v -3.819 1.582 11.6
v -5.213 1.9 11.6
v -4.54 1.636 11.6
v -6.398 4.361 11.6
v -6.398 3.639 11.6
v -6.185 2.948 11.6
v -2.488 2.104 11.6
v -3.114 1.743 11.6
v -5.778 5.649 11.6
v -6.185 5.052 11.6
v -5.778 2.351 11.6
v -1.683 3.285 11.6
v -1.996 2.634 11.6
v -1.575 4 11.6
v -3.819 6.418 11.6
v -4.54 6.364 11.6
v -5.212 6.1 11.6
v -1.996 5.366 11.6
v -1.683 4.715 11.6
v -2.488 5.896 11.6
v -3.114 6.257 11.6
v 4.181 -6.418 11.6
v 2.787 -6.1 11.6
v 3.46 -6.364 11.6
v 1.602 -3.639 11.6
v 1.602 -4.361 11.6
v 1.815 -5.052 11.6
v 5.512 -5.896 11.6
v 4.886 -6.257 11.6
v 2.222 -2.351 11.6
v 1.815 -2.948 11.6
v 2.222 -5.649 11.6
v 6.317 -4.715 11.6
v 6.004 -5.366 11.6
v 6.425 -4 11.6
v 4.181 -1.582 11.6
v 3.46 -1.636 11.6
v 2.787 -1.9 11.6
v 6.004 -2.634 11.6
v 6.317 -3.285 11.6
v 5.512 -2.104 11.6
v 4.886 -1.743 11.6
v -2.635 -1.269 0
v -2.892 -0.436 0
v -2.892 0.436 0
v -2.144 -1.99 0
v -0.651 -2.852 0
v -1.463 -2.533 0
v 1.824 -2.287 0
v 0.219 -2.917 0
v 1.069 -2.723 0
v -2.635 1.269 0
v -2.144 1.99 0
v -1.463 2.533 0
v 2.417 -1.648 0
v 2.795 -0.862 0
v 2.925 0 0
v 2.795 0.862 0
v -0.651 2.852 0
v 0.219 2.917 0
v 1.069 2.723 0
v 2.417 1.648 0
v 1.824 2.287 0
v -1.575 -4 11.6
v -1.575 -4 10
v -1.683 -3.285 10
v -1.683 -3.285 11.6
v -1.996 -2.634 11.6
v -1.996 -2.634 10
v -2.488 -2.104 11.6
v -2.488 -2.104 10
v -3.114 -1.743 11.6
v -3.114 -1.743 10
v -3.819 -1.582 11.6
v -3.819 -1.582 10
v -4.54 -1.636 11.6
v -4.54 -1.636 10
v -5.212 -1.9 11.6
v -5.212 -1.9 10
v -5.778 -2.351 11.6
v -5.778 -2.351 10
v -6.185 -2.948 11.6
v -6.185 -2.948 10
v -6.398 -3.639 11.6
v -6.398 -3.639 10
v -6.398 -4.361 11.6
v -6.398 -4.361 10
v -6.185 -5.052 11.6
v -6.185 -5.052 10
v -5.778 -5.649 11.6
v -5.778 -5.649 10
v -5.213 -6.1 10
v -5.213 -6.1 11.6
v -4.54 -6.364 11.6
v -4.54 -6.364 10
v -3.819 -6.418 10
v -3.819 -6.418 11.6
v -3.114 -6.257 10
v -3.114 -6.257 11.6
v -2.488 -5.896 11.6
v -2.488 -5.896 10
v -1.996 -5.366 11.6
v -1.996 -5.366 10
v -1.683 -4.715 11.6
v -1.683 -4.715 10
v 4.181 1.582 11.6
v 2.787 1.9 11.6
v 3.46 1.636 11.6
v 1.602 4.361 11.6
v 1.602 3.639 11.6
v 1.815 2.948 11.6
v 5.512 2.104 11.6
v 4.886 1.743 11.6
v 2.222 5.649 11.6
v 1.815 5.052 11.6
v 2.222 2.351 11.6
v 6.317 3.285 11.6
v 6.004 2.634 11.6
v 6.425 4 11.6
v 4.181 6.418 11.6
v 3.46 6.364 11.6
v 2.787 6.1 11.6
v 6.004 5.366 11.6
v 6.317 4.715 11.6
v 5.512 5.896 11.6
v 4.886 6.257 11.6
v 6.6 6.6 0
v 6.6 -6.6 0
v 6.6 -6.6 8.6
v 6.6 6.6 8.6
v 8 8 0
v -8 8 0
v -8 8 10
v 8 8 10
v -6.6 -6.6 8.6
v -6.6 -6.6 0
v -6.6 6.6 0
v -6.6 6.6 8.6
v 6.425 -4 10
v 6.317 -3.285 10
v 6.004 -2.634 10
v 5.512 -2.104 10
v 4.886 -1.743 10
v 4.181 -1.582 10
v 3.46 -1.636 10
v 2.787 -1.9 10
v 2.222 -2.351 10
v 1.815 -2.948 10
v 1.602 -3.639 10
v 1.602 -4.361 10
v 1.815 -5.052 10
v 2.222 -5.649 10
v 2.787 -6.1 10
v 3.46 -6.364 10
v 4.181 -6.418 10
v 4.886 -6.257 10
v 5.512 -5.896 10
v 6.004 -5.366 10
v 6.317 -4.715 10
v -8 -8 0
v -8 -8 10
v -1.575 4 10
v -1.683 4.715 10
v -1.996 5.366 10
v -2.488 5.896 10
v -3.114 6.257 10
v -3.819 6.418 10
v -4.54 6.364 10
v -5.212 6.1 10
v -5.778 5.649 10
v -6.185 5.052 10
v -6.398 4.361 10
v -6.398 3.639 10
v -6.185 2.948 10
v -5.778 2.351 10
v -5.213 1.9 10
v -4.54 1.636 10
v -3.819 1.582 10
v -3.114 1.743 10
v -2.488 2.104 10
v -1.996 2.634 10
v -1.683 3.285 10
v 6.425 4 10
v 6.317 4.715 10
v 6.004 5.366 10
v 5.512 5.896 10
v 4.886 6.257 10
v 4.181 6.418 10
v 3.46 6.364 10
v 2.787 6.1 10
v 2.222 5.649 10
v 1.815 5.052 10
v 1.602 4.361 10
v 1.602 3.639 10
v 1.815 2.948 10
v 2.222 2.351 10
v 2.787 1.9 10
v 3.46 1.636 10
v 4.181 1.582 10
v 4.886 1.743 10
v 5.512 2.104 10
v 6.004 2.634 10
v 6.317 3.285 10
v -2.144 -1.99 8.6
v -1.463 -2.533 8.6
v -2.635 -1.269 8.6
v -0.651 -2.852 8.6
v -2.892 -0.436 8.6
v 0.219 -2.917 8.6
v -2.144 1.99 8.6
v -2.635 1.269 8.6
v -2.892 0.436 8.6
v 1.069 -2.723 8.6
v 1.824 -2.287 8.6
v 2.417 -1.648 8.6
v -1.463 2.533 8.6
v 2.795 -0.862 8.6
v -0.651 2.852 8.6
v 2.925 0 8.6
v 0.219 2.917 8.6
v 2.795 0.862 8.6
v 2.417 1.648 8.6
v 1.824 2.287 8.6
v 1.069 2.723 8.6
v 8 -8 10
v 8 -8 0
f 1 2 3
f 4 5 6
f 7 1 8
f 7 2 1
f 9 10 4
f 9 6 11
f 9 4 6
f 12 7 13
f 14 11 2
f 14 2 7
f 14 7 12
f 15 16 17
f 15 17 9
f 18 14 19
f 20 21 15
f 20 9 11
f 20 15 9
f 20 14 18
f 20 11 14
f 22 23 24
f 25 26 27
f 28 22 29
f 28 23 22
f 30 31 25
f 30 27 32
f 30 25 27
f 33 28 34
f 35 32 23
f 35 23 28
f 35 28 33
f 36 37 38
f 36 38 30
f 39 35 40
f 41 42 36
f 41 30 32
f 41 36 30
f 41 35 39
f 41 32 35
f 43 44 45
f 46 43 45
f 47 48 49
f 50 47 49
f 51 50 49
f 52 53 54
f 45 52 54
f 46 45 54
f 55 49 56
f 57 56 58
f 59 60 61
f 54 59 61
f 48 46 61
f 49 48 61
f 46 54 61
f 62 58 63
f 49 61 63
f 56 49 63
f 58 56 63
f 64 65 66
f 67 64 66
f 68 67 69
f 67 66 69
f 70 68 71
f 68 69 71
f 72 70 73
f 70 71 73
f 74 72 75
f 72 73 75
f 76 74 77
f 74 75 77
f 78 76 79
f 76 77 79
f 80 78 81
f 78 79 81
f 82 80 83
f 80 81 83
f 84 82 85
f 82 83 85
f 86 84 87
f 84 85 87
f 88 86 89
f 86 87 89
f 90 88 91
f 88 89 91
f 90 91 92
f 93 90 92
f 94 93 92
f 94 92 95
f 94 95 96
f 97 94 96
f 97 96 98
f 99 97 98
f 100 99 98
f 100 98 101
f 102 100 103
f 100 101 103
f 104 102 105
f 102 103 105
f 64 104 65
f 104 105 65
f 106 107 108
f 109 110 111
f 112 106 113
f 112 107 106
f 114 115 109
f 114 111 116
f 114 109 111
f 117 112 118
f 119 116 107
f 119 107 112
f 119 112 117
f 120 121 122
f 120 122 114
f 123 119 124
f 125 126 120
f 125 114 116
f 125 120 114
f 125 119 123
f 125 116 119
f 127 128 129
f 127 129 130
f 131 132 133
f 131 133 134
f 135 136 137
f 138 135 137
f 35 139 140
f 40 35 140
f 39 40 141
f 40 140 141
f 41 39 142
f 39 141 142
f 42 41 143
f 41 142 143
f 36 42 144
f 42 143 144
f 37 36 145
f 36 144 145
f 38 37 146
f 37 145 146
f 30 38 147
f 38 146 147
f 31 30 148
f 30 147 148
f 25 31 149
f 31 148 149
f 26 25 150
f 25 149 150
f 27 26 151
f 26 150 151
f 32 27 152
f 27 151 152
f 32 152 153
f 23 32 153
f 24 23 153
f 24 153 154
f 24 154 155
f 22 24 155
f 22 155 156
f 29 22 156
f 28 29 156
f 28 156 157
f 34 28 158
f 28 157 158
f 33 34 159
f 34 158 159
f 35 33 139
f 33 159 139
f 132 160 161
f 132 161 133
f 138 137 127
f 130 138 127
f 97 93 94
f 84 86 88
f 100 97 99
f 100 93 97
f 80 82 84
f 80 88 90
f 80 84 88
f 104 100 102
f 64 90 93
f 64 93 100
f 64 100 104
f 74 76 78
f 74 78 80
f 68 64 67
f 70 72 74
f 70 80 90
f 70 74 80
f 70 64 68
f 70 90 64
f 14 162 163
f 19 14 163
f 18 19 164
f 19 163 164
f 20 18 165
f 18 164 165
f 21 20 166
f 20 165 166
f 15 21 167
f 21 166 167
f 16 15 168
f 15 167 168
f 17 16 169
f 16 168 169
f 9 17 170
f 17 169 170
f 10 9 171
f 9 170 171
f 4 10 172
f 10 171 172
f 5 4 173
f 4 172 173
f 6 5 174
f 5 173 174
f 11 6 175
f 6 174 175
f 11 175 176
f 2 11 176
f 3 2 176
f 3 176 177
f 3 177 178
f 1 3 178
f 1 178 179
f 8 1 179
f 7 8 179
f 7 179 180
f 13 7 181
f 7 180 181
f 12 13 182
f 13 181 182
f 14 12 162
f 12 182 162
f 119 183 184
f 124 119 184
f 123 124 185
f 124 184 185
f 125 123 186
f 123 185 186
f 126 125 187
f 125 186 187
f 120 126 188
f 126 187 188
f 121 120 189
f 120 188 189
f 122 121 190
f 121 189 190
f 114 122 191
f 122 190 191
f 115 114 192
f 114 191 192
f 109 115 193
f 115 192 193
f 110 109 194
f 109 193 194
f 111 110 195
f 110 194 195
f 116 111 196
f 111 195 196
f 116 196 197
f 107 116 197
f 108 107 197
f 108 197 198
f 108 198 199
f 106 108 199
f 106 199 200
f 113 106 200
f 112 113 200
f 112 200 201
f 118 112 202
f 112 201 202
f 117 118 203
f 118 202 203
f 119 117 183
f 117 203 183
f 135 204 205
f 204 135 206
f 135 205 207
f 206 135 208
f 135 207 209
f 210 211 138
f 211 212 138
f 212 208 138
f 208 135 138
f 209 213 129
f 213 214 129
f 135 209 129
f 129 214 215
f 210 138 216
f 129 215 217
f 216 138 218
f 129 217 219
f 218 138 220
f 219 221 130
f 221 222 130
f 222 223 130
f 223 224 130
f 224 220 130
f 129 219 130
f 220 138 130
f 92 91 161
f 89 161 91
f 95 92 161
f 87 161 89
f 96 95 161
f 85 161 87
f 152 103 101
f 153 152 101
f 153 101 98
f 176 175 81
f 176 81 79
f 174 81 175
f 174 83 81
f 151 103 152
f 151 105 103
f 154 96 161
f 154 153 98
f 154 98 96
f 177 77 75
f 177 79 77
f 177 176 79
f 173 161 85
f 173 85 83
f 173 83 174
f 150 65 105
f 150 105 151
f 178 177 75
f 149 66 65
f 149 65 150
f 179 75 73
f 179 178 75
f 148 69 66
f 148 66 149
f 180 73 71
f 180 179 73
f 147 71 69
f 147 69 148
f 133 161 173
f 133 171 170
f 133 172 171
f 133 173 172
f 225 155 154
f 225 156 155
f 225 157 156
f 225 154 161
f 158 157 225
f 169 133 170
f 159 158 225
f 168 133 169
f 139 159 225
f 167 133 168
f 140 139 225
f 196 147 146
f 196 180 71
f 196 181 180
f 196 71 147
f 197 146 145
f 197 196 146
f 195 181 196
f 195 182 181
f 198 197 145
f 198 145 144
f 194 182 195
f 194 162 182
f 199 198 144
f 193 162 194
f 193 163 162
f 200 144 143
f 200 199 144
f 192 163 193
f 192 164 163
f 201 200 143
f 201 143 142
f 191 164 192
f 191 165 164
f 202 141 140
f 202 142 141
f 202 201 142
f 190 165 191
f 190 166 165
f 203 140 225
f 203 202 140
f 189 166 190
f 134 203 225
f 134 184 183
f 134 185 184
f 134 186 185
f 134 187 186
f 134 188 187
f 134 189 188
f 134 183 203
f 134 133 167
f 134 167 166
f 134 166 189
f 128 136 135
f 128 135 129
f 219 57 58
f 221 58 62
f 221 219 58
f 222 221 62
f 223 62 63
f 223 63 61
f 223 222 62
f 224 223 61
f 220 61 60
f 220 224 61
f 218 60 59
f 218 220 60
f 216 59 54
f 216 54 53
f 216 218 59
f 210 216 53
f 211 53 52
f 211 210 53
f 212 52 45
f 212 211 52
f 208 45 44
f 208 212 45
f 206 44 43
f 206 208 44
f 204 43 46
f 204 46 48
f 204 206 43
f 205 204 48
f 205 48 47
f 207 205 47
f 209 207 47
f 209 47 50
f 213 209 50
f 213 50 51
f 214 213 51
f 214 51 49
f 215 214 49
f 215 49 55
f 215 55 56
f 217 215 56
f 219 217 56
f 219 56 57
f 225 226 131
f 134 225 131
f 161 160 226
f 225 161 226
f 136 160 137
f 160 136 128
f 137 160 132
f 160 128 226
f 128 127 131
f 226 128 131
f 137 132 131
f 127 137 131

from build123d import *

# Parameters (mm, degrees)
F0_W     = 16
F0_H     = 16
F1_DEPTH = 10
F2_T     = -1.4
F3_R     = 2.425
F4_DEPTH = 1.6
F5_R     = 2.925
F6_DEPTH = 10


with BuildPart() as f1:
    # F0 (on Top) → F1 (new body)
    with BuildSketch(Plane.XY):
        Rectangle(F0_W, F0_H)
    extrude(amount=F1_DEPTH)

    # F2
    f2_openings = [f1.faces().sort_by_distance(p)[0] for p in [
        (0, 0, 0),
    ]]
    offset(amount=F2_T, openings=f2_openings)

    # F3 (on face) → F4 (join)
    with BuildSketch(Plane.XY.offset(10)):
        with Locations((-4, -4)):
            Circle(F3_R)
        with Locations((-4, 4)):
            Circle(F3_R)
        with Locations((4, -4)):
            Circle(F3_R)
        with Locations((4, 4)):
            Circle(F3_R)
    extrude(amount=F4_DEPTH)

    # F5 (on face) → F6 (join)
    with BuildSketch(Plane.XY.offset(10)):
        Circle(F5_R)
    extrude(amount=-F6_DEPTH)


solid = f1.part
